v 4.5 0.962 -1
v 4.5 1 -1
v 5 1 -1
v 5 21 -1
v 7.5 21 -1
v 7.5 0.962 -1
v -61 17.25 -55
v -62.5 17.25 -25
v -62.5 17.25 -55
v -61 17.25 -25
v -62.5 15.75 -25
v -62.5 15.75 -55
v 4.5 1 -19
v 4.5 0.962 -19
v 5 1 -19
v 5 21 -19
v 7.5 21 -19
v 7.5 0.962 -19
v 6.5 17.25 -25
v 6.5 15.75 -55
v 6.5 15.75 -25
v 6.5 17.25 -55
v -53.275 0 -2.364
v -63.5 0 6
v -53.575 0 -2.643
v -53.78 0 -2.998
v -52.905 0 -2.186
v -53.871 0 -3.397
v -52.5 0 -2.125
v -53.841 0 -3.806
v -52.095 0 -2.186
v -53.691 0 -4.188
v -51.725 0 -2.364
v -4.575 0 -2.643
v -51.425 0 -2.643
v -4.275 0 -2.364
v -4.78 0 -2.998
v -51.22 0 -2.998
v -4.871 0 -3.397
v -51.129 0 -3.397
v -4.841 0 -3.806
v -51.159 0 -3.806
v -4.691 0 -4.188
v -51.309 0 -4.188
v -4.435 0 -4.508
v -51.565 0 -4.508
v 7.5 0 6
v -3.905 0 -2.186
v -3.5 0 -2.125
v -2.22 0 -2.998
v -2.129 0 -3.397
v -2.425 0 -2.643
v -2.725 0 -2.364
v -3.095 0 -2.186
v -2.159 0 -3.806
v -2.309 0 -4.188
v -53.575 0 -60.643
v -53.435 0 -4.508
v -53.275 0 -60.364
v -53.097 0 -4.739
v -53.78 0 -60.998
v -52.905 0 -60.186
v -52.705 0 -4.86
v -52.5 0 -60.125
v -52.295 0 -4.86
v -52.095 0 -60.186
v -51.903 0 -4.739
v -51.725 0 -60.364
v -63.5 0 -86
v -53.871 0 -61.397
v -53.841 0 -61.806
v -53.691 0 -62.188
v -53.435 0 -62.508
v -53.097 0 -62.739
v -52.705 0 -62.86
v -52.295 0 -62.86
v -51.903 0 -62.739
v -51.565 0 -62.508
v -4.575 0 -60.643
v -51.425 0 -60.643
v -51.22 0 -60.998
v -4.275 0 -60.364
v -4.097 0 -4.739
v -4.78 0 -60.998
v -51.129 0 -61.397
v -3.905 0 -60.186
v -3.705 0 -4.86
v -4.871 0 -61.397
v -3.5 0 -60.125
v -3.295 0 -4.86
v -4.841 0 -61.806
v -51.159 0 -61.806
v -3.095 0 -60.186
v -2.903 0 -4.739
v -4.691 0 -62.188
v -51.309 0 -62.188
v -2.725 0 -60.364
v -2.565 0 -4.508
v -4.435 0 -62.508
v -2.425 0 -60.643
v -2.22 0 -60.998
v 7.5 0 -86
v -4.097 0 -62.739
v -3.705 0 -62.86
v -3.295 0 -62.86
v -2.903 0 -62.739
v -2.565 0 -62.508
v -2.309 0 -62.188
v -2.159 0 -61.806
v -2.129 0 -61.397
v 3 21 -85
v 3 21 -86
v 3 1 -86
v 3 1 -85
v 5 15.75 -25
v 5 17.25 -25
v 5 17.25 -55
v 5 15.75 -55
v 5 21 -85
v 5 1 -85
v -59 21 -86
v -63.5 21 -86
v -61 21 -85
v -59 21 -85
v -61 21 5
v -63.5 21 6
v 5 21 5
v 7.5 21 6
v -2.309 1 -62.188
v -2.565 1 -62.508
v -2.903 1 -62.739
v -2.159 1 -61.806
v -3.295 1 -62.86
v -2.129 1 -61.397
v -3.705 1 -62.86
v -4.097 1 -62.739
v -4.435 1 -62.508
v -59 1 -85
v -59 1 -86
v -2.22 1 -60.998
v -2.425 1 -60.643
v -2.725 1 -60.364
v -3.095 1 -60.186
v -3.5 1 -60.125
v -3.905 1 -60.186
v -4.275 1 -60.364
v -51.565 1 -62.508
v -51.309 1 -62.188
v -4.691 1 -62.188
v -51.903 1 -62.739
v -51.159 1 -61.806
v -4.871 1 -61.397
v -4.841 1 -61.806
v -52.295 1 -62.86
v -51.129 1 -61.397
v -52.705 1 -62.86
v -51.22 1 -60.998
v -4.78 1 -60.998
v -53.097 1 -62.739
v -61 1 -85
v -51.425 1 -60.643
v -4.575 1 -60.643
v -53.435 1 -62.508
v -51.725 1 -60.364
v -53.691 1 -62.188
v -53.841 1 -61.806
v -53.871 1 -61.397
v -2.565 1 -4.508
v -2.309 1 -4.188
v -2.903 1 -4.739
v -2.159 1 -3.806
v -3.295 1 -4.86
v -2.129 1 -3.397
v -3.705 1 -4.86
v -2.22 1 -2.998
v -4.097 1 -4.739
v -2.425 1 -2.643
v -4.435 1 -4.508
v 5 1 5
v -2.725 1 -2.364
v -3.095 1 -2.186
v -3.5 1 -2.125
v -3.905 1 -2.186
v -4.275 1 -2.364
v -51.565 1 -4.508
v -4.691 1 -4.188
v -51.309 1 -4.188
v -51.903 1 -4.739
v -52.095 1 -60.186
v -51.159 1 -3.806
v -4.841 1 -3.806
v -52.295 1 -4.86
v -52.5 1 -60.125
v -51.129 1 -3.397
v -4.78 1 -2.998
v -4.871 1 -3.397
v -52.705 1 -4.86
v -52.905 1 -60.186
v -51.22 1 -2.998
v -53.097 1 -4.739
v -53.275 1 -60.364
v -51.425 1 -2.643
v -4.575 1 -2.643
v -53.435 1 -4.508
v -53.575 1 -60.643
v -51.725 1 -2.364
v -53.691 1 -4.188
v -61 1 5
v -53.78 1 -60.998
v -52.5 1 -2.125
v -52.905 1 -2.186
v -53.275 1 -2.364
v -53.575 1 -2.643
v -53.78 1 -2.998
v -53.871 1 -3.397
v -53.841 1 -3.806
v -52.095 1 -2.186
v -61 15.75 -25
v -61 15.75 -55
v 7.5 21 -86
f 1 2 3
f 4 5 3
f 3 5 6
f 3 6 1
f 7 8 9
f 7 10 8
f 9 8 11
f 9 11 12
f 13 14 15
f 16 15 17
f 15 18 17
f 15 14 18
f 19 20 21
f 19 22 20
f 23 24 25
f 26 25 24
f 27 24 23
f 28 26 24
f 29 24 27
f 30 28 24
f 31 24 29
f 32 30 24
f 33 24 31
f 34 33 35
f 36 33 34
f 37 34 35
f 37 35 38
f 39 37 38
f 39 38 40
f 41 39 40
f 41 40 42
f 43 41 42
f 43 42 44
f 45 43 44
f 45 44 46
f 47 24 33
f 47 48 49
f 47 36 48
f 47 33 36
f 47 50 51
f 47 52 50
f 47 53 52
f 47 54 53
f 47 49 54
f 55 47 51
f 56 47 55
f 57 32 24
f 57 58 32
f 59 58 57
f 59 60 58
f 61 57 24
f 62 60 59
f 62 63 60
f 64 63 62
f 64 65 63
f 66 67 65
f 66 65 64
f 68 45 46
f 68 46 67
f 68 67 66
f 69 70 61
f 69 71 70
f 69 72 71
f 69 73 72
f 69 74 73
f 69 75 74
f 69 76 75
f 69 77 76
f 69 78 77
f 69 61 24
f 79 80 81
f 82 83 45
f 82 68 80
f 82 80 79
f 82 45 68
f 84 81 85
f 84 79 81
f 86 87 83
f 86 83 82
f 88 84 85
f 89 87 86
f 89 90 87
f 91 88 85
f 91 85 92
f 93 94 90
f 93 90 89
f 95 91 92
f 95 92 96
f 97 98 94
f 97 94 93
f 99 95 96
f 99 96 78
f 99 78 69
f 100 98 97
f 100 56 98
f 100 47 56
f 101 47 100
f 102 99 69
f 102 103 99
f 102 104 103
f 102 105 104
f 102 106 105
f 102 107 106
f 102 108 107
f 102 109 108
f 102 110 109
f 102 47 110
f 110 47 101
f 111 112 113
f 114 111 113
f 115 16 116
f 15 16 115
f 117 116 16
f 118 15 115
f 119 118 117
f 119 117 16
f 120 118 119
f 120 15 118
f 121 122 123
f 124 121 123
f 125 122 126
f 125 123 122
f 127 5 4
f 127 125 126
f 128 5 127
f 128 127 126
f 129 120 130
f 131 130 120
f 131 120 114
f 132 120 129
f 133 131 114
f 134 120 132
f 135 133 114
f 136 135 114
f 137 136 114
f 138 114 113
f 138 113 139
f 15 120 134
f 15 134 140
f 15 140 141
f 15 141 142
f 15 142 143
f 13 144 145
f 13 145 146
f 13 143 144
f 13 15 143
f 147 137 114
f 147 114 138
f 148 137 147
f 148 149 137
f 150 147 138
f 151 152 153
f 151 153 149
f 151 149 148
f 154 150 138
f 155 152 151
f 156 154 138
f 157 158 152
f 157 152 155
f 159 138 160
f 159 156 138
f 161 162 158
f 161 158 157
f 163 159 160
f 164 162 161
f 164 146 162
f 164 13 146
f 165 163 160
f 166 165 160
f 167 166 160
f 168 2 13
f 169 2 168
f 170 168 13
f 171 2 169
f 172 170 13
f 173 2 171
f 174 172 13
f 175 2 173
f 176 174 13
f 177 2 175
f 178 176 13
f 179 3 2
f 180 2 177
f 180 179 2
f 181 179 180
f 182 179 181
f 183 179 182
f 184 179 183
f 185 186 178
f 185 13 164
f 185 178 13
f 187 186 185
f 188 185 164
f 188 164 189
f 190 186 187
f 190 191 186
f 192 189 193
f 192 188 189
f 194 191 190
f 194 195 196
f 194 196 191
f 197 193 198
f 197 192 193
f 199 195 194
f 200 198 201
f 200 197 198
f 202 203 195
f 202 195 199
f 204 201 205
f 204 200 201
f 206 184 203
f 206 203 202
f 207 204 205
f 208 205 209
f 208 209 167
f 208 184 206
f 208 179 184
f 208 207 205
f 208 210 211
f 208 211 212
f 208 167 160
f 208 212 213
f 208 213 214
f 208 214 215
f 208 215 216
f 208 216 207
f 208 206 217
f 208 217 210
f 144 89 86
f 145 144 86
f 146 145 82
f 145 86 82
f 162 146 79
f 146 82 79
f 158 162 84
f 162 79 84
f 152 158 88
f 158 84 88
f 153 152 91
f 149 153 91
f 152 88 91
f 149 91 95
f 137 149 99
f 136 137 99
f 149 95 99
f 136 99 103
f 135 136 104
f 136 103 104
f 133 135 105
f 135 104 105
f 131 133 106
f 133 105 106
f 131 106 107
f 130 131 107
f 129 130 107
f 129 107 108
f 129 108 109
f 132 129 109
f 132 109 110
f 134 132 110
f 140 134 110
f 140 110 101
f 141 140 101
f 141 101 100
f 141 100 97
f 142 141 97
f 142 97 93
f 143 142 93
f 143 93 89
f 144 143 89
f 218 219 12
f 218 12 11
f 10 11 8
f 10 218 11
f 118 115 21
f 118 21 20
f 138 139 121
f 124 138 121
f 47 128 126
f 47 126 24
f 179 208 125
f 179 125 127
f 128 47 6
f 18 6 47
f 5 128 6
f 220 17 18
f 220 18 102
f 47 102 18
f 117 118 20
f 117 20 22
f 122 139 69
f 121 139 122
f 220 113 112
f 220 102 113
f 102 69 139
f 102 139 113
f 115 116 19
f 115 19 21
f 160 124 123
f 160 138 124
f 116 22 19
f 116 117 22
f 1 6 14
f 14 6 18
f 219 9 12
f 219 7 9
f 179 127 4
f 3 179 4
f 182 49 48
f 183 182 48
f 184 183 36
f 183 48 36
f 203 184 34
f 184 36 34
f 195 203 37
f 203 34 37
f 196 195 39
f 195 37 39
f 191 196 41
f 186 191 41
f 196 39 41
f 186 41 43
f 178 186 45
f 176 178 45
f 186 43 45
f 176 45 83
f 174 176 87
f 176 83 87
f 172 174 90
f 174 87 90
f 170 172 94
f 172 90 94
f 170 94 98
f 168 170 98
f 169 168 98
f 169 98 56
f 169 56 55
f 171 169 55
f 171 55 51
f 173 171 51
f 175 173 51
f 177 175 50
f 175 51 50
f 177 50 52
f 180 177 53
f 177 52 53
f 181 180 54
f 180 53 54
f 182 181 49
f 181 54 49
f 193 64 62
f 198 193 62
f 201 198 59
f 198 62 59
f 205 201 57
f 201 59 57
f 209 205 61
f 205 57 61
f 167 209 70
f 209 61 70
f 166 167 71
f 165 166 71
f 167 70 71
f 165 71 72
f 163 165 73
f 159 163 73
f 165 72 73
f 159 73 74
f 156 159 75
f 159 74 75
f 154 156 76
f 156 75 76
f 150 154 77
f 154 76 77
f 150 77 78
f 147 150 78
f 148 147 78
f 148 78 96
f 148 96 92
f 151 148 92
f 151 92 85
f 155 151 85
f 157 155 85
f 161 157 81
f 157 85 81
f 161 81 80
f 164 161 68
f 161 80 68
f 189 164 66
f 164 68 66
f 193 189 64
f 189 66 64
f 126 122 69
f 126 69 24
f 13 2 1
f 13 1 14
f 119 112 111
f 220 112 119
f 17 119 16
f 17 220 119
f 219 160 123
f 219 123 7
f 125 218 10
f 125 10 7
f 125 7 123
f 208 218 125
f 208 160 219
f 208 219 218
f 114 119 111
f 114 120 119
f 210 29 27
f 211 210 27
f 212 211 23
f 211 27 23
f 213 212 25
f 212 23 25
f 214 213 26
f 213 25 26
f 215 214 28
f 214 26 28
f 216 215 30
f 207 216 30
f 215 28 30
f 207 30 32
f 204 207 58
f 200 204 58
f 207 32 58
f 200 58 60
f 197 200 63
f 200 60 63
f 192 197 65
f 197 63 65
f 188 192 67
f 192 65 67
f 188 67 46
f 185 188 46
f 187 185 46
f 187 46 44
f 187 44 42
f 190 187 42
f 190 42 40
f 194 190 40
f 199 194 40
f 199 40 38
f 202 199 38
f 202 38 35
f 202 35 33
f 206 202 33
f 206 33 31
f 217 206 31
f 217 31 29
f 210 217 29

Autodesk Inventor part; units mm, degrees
ref_plane "YZ Plane" through (0, 0, 0) normal (1, 0, 0) x (0, 1, 0)
ref_plane "XZ Plane" through (0, 0, 0) normal (0, 1, 0) x (-1, 0, 0)
ref_plane "XY Plane" through (0, 0, 0) normal (0, 0, 1) x (1, 0, 0)
sketch "Sketch1" plane through (0, 0, 0) normal (0, 1, 0) x (-1, 0, 0)
  line L0 (0, 0) -> (56, 0)
  line L1 (56, 0) -> (56, -85)
  line L2 (56, -85) -> (0, -85)
  line L3 (0, -85) -> (0, 0)
  line L4 (61, -90) -> (61, 5)
  line L5 (61, 5) -> (-5, 5)
  line L6 (-5, 5) -> (-5, -90)
  line L7 (61, -85) -> (-5, -85)
  dimension "d0" = 56
  dimension "d1" = 85
  dimension "d2" = 5
  dimension "d50" = 90
extrude "Extrusion1" add sketch "Sketch1" along normal blind 1
sketch "Sketch2" plane through (0, 1, 0) normal (0, 1, 0) x (1, 0, 0)
  line L0 (-61, -5) -> (5, -5) projected
  line L1 (-61, 85) -> (-61, -5) projected
  line L2 (-61, -5) -> (5, -5) projected
  line L3 (5, -5) -> (5, 85) projected
  line L4 (5, 85) -> (-61, 85) projected
  line L5 (-62, 86) -> (6, 86)
  line L6 (6, 86) -> (6, -6)
  line L7 (6, -6) -> (-62, -6)
  line L8 (-62, -6) -> (-62, 86)
  point P0 (0, 0)
  dimension "d41" = 1
sketch "Sketch4" plane through (0, 1, 0) normal (0, 1, 0) x (1, 0, 0)
  line L0 (0, 0) -> (-56, 0)
  line L1 (-56, 0) -> (-56, 85)
  line L2 (-56, 85) -> (0, 85)
  line L3 (0, 85) -> (0, 0)
  circle A0 centre (-3.5, 3.5) radius 1.375
  circle A1 centre (-52.5, 3.5) radius 1.375
  circle A2 centre (-52.5, 61.5) radius 1.375
  circle A3 centre (-3.5, 61.5) radius 1.375
  circle A4 centre (-52.5, 3.5) radius 3.1
  circle A5 centre (-52.5, 61.5) radius 3.1
  circle A6 centre (-3.5, 3.5) radius 3.1
  circle A7 centre (-3.5, 61.5) radius 3.1
  dimension "d14" = 56
  dimension "d15" = 85
  dimension "d16" = 2.75
  dimension "d17" = 2.75
  dimension "d18" = 2.75
  dimension "d19" = 2.75
  dimension "d20" = 49
  dimension "d21" = 58
  dimension "d22" = 58
  dimension "d23" = 49
  dimension "d24" = 6.2
  dimension "d25" = 6.2
  dimension "d26" = 6.2
  dimension "d27" = 6.2
  dimension "d28" = 3.5
  dimension "d29" = 3.5
  dimension "d30" = 3.5
  dimension "d31" = 3.5
  dimension "d32" = 3.5
hole "Hole1" at (-52.5, 1, -61.5) at (-52.5, 1, -3.5) at (-3.5, 1, -3.5) at (-3.5, 1, -61.5) direction (0, -1, 0) diameter 2.75 end through all
extrude "Extrusion4" add sketch "Sketch2" along normal blind 20 and the other way blind 1
sketch "Sketch5" plane through (6, 21, -86) normal (0, 0, -1) x (-1, 0, 0)
  line L0 (67, -20) -> (1, -20) projected
  line L1 (68, 0) -> (0, 0) projected
  line L2 (3, -20) -> (65, -20)
  line L3 (65, -20) -> (65, 0)
  line L4 (65, 0) -> (3, 0)
  line L5 (3, 0) -> (3, -20)
  line L6 (67, 0) -> (67, -20) projected
  line L7 (1, 0) -> (1, -20) projected
  point P0 (6, -21)
  dimension "d46" = 2
  dimension "d47" = 2
extrude "Extrusion5" cut sketch "Sketch5" against normal blind 2 contours L0 L5 L1 L3
sketch "Sketch6" plane through (6, 0, -86) normal (1, 0, 0) x (0, 0, -1)
  line L0 (0, 21) -> (0, 0) projected
  line L1 (-92, 21) -> (0, 21) projected
  line L2 (-92, 21) -> (-92, 0) projected
  line L3 (0, 0) -> (-92, 0) projected
  point P0 (-86, 0)
extrude "Extrusion6" add sketch "Sketch6" along normal blind 1.5
sketch "Sketch7" plane through (-62, 0, 6) normal (-1, 0, 0) x (0, 0, 1)
  line L0 (0, 21) -> (0, 0) projected
  line L1 (-92, 21) -> (0, 21) projected
  line L2 (-92, 0) -> (-92, 21) projected
  line L3 (0, 0) -> (-92, 0) projected
  point P0 (-6, 0)
extrude "Extrusion7" add sketch "Sketch7" along normal blind 1.5
sketch "Sketch8" plane through (0, 21, 0) normal (0, 1, 0) x (1, 0, 0)
  line L0 (7.5, -6) -> (-63.5, -6) projected
  line L1 (7.5, 86) -> (7.5, -6) projected
  line L2 (-63.5, -6) -> (-63.5, 86) projected
  line L3 (-59, 86) -> (3, 86) projected
  line L4 (-59, 86) -> (-63.5, 86) projected
  line L5 (3, 86) -> (7.5, 86) projected
  point P0 (0, 0)
  dimension "d55" = 92
  dimension "d56" = 71
sketch "Sketch9" plane through (-61, 1, 5) normal (1, 0, 0) x (0, 0, -1)
  line L0 (0, 0) -> (0, 20) projected
  line L1 (90, 20) -> (90, 0) projected
  line L2 (0, 20) -> (90, 20) projected
  line L3 (30, 16.25) -> (60, 16.25)
  line L4 (60, 16.25) -> (60, 14.75)
  line L5 (60, 14.75) -> (30, 14.75)
  line L6 (30, 14.75) -> (30, 16.25)
  point P0 (5, -1)
  point P1 (0, 16)
  point P2 (90, 15)
  dimension "d62" = 3.75
  dimension "d63" = 1.5
  dimension "d64" = 30
  dimension "d65" = 30
  dimension "d66" = 30
extrude "Extrusion8" cut sketch "Sketch9" against normal blind 1.5
ref_plane "Work Plane2" through (-28, 0, -86) normal (1, 0, 0) x (0, 0, -1)
mirror "Mirror1" about plane through (-28, 0, -86) normal (1, 0, 0) of "Extrusion8"
sketch "Sketch10" plane through (7.5, 0, -86) normal (1, 0, 0) x (0, 0, -1)
  line L0 (-91, 21) -> (-1, 21) projected
  line L1 (-85, 0.9618) -> (-67, 0.9618)
  line L2 (-67, 0.9618) -> (-67, 21)
  line L3 (-67, 21) -> (-85, 21)
  line L4 (-85, 21) -> (-85, 0.9618)
  line L5 (-92, 21) -> (-92, 0) projected
  point P0 (-86, 0)
  point P1 (-76, 0.9618)
  dimension "d67" = 7
  dimension "d68" = 18
  dimension "d69" = 16
  dimension "d72" = 25
extrude "Extrusion9" cut sketch "Sketch10" against normal blind 3
equation "\"d22\" = d21"
equation "\"d23\" = d20"
properties part number "bottom2"
